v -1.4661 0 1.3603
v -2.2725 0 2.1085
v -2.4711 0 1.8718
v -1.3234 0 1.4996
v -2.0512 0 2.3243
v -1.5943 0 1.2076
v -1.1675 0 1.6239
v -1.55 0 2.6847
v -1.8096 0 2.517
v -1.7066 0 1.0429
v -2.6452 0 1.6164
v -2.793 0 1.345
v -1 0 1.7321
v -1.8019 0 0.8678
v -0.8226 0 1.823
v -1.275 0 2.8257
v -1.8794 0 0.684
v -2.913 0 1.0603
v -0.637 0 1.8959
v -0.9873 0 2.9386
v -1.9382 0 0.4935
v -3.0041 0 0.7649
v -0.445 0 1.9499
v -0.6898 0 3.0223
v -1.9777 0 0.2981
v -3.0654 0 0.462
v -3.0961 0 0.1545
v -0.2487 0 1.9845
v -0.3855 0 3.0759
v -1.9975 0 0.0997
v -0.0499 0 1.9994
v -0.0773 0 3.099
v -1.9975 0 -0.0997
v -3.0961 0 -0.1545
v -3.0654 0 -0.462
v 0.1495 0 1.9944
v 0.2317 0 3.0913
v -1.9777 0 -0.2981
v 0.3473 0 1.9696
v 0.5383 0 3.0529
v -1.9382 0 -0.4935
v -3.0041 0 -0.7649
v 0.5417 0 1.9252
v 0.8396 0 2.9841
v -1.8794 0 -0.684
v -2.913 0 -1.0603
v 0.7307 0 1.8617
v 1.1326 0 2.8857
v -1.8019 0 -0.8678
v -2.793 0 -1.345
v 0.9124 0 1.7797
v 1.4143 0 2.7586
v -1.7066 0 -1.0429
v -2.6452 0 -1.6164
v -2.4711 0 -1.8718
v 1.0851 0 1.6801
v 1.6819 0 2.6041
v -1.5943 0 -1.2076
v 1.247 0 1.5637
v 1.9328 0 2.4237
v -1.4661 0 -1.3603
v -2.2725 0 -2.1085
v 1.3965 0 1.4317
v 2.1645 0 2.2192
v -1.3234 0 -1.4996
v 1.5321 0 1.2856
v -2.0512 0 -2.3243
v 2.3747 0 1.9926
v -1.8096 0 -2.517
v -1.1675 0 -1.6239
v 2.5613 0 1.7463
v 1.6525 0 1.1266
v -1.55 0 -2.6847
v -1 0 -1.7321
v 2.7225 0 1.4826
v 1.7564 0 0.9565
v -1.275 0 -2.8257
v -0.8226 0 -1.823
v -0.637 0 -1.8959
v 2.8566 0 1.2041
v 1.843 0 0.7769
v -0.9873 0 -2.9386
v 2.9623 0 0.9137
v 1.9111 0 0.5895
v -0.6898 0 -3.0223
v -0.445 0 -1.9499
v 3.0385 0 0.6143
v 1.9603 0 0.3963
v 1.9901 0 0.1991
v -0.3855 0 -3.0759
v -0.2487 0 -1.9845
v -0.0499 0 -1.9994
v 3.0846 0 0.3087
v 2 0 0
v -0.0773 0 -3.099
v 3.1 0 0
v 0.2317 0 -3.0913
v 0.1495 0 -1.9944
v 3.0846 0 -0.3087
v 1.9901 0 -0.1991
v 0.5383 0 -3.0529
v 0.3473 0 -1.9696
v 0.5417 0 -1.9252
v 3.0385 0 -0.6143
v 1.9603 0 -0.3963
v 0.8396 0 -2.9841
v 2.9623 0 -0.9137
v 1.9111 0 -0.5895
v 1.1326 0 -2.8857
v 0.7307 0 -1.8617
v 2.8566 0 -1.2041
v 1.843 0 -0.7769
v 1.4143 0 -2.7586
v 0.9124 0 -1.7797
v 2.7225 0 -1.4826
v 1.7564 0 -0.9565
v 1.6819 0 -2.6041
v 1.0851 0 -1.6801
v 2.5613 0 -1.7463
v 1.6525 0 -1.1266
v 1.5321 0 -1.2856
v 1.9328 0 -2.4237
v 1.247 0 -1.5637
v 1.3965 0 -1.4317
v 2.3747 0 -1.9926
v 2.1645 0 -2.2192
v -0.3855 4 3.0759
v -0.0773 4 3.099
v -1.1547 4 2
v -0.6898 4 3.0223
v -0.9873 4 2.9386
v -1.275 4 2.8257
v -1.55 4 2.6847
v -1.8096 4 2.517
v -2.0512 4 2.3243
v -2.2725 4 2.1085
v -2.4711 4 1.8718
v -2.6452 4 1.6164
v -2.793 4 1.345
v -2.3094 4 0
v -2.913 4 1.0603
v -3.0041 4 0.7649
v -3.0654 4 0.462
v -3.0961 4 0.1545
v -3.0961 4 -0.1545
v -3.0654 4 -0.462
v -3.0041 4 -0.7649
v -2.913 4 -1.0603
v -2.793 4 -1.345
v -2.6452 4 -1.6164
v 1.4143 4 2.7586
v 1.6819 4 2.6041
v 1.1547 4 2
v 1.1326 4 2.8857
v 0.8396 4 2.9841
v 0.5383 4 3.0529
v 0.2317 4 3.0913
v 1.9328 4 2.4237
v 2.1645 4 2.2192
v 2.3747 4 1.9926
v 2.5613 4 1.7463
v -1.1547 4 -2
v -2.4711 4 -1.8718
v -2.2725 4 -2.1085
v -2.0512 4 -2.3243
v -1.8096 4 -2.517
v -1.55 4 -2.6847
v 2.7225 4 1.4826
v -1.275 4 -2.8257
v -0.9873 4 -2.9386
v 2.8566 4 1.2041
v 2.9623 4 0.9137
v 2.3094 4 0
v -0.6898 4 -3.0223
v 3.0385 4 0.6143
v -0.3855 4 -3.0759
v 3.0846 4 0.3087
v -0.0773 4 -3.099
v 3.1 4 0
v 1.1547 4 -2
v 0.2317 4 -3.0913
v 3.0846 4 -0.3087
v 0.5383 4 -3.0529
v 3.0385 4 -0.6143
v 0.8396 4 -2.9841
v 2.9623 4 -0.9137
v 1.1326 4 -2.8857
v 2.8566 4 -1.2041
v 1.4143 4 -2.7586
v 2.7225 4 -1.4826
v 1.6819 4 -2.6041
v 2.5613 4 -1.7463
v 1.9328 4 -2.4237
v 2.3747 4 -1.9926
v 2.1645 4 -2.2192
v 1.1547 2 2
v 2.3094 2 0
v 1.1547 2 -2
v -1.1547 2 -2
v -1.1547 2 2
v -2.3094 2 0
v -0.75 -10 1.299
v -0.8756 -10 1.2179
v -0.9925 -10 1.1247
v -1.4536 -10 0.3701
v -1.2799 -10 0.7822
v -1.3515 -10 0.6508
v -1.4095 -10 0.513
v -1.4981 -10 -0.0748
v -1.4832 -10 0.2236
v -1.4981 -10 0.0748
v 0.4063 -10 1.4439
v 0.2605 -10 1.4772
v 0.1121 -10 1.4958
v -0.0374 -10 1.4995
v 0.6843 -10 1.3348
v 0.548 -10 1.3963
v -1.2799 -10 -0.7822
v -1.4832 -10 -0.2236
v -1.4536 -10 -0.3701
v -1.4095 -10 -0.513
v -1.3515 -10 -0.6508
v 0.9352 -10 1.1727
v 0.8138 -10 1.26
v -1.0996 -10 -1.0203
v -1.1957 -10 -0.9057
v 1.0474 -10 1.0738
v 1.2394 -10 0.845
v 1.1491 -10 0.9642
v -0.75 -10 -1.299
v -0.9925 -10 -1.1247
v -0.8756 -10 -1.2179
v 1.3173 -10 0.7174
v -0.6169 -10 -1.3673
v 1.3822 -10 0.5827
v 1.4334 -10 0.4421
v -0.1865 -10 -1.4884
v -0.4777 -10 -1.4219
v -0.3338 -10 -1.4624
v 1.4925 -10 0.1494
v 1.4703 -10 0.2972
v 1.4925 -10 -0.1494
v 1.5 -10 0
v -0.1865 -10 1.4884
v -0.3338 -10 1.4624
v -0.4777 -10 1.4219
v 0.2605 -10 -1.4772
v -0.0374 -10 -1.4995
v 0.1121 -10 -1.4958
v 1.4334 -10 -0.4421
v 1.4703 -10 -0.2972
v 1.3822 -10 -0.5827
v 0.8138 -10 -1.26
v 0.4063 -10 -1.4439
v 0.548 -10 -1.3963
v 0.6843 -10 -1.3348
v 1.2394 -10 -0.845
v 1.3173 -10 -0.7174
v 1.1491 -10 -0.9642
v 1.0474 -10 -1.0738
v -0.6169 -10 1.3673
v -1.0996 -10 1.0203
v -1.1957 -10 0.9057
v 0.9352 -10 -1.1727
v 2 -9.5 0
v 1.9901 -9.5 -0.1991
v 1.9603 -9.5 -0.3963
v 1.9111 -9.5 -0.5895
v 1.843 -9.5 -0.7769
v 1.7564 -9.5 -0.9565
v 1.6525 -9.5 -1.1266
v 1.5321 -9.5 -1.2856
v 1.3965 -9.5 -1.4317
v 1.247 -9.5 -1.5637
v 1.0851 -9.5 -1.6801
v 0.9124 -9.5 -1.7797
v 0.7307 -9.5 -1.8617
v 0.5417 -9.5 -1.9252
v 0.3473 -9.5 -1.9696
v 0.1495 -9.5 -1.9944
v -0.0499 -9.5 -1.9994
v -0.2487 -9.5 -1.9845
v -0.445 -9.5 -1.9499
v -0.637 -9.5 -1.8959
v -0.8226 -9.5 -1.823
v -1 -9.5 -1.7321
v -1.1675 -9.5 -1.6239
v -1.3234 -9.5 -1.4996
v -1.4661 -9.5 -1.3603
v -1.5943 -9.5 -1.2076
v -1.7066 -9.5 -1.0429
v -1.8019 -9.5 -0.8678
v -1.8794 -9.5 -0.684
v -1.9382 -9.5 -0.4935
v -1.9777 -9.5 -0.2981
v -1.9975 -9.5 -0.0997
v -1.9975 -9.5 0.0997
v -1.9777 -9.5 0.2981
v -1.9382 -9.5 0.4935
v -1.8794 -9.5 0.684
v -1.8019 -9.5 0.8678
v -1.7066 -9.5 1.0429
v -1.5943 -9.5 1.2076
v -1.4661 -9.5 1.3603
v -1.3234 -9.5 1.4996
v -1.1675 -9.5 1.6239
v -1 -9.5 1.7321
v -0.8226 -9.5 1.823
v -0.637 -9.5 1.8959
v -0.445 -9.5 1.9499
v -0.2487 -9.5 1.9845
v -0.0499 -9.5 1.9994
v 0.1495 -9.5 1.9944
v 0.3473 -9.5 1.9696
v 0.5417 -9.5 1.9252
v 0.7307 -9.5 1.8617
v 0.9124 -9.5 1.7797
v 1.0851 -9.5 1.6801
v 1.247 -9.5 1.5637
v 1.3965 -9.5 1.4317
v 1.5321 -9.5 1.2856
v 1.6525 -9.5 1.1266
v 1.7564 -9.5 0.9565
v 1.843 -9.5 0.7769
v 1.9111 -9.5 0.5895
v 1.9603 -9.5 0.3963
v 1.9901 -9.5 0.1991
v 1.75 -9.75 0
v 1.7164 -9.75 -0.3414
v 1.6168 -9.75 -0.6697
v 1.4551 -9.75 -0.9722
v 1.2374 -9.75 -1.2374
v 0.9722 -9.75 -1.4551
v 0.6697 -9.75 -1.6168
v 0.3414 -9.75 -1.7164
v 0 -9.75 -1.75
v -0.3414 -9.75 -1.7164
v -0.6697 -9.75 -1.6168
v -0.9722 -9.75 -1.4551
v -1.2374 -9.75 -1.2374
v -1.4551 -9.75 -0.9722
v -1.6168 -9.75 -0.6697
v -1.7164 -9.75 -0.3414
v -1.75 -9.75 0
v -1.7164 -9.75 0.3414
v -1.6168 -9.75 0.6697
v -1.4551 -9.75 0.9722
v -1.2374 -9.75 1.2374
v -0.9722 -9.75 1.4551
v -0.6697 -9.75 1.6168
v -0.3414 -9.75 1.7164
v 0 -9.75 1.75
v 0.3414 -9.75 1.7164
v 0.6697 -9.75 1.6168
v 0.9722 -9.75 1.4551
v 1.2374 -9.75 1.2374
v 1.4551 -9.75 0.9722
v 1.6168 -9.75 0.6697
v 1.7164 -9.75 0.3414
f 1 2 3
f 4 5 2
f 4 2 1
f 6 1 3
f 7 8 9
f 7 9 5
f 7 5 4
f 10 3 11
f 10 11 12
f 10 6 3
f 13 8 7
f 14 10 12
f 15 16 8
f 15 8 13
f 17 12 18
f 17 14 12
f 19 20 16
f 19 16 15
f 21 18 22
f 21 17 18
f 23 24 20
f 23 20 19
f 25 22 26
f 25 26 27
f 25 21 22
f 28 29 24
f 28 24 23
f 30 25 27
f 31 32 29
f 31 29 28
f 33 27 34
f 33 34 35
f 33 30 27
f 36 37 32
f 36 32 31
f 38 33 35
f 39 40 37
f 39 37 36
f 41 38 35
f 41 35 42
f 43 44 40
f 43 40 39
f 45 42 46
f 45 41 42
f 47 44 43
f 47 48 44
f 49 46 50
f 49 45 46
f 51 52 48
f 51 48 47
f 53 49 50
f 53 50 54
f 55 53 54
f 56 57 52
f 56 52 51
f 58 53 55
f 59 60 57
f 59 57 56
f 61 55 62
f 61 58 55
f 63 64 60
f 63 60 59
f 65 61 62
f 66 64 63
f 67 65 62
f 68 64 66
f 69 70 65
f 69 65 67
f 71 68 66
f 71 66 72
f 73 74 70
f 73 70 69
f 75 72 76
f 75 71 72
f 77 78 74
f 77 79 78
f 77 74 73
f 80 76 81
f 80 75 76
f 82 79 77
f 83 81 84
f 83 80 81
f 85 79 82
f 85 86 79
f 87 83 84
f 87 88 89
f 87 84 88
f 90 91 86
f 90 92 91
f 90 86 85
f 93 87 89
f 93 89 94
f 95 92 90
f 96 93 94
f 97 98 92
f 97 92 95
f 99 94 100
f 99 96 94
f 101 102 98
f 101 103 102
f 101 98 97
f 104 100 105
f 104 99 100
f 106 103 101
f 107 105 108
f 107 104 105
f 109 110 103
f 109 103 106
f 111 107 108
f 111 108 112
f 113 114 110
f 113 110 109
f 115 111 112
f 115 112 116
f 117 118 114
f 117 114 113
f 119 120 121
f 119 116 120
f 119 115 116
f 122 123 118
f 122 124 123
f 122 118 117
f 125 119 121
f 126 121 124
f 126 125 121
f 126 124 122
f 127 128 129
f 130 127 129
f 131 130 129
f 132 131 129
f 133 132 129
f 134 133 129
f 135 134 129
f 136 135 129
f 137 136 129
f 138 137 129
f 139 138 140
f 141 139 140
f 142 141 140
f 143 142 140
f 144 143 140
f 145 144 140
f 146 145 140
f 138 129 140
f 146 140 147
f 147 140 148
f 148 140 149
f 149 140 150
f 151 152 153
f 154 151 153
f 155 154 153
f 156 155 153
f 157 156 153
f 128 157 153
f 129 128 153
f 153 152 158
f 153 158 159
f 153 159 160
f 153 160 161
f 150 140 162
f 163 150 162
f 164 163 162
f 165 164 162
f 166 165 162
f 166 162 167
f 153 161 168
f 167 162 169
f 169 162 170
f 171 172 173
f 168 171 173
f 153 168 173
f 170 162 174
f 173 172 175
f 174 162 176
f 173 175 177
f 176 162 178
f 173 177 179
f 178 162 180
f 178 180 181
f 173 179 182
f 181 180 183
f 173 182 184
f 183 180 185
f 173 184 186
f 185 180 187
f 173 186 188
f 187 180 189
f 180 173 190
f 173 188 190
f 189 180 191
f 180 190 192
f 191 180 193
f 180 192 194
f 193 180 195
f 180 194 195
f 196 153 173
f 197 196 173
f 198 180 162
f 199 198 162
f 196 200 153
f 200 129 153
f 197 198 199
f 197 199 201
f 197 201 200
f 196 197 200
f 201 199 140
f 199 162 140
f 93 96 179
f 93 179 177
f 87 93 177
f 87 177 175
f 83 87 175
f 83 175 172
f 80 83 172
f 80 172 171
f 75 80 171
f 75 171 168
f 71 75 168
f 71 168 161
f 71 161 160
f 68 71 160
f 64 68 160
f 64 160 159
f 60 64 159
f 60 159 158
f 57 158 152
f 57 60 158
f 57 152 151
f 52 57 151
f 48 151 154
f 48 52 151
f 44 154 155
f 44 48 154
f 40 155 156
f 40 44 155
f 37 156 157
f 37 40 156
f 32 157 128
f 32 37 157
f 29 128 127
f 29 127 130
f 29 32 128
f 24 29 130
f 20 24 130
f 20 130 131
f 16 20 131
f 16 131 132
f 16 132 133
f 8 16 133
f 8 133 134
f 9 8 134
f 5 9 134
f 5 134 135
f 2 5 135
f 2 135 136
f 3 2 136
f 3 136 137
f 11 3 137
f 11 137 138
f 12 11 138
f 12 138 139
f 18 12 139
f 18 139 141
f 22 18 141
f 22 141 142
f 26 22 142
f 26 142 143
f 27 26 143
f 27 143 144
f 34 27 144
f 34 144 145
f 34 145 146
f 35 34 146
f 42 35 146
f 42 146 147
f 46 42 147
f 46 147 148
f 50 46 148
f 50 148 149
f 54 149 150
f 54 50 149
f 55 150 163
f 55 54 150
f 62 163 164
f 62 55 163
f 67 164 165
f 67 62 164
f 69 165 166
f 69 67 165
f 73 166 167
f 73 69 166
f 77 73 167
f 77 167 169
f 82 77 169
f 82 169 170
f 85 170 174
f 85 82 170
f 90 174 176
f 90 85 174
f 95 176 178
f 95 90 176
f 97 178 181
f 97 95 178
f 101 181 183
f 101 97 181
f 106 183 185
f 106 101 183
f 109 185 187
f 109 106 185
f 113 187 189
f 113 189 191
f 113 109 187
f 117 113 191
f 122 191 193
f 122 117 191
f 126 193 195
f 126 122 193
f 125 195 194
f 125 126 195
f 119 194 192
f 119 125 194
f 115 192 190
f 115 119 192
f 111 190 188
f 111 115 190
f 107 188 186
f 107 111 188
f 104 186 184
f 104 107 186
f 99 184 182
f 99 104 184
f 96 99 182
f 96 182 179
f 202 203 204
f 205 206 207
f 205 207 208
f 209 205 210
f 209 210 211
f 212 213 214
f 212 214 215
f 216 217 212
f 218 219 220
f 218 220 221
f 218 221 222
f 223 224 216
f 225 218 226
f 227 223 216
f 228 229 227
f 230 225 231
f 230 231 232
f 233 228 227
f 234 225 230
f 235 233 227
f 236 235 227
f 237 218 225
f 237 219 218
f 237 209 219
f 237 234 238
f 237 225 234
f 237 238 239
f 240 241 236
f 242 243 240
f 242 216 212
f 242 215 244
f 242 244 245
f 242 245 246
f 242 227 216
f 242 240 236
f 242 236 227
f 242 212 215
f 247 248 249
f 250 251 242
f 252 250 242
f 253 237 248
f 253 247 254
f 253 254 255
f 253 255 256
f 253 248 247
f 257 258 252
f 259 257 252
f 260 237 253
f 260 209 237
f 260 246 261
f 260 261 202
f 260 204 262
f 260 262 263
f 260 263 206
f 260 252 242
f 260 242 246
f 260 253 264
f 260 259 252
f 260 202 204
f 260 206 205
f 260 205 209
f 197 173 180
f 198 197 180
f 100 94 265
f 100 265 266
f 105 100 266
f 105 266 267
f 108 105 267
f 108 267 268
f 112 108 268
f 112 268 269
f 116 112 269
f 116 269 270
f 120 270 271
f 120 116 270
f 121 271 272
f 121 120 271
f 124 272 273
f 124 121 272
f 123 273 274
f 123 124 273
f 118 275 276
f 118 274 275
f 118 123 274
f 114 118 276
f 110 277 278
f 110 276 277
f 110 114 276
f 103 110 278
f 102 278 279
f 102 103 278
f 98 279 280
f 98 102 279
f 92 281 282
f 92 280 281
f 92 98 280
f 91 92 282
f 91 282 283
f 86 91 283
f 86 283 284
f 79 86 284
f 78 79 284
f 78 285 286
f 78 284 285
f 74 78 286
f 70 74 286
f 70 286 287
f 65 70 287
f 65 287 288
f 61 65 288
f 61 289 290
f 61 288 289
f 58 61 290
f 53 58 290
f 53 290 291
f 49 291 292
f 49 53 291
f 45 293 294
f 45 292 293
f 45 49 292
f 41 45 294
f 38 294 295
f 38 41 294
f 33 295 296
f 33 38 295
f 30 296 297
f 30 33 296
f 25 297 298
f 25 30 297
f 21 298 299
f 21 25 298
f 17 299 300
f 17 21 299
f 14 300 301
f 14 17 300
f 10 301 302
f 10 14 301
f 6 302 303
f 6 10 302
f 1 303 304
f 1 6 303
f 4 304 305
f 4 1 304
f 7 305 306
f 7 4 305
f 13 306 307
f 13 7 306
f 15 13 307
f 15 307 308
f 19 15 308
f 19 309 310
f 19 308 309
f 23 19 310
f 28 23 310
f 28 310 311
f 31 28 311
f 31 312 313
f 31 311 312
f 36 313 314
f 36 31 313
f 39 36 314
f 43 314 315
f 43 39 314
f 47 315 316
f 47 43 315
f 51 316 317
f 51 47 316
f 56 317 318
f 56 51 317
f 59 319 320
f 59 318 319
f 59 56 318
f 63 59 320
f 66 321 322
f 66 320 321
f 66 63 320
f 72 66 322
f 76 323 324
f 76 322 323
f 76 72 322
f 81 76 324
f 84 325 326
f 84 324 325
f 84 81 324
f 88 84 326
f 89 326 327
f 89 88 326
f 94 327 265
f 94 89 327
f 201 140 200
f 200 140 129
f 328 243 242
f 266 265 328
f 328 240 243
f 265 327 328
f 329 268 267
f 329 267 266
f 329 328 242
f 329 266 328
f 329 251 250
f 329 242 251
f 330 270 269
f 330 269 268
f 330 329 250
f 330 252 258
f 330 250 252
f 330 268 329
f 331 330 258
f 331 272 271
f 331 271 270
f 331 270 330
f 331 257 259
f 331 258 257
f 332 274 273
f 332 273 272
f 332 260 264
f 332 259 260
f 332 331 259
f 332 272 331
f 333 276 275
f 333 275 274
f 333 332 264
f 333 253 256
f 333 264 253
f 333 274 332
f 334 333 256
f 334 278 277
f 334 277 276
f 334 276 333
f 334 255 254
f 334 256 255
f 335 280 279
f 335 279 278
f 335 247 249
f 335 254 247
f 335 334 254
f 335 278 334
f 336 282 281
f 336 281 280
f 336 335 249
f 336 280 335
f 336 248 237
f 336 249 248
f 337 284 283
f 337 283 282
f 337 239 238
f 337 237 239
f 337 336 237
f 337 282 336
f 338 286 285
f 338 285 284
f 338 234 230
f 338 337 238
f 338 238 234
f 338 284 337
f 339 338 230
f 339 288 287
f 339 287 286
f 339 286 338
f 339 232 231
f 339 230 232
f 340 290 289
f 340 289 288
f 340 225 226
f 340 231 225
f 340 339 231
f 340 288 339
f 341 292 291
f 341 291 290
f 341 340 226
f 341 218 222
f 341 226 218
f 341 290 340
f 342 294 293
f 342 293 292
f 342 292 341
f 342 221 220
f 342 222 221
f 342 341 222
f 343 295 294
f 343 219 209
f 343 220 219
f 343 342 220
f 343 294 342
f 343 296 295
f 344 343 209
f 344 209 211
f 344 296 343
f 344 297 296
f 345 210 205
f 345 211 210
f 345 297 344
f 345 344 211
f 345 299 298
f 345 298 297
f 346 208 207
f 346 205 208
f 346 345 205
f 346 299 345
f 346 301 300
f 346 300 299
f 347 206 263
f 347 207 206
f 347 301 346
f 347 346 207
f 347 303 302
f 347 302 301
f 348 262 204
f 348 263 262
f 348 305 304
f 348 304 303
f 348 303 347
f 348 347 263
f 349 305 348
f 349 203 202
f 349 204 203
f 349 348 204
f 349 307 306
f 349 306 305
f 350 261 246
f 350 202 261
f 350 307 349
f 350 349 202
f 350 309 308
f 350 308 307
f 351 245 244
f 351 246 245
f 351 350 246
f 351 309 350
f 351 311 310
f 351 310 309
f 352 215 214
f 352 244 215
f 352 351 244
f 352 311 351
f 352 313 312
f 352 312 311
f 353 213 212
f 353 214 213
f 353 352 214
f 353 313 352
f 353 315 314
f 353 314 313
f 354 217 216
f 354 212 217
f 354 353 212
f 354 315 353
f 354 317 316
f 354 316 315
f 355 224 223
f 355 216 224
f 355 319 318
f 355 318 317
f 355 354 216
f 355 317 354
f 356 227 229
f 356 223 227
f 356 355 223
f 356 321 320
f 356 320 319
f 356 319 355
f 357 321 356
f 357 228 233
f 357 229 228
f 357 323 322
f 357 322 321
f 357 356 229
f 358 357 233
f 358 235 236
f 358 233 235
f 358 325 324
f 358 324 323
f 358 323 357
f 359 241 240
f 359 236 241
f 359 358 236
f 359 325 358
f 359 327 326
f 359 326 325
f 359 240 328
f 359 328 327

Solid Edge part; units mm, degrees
sketch "Sketch1" plane through (0, 0, 0) normal (0, -1, 0) x (1, 0, 0)
  circle A0 centre (0, 0) radius 3.1
  dimension "D1" = 6.2
extrude "Protrusion1" add sketch "Sketch1" against normal blind 4
sketch "Sketch2" plane through (0, 0, 0) normal (0, -1, 0) x (1, 0, 0)
  circle A0 centre (0, 0) radius 2
  dimension "D1" = 4
extrude "Protrusion2" add sketch "Sketch2" along normal blind 10
sketch "Sketch3" plane through (0, 4, 0) normal (0, 1, 0) x (-1, 0, 0)
  line L0 (1.1547, 2) -> (-1.1547, 2)
  line L1 (-1.1547, 2) -> (-2.3094, 0)
  line L2 (-2.3094, 0) -> (-1.1547, -2)
  line L3 (-1.1547, -2) -> (1.1547, -2)
  line L4 (1.1547, -2) -> (2.3094, 0)
  line L5 (2.3094, 0) -> (1.1547, 2)
extrude "Cutout1" cut sketch "Sketch3" against normal blind 2
chamfer "Chamfer1" distance 0.5 angle 45 1 edges at (-2, -10, 0)
properties part number "SOCKET2"
